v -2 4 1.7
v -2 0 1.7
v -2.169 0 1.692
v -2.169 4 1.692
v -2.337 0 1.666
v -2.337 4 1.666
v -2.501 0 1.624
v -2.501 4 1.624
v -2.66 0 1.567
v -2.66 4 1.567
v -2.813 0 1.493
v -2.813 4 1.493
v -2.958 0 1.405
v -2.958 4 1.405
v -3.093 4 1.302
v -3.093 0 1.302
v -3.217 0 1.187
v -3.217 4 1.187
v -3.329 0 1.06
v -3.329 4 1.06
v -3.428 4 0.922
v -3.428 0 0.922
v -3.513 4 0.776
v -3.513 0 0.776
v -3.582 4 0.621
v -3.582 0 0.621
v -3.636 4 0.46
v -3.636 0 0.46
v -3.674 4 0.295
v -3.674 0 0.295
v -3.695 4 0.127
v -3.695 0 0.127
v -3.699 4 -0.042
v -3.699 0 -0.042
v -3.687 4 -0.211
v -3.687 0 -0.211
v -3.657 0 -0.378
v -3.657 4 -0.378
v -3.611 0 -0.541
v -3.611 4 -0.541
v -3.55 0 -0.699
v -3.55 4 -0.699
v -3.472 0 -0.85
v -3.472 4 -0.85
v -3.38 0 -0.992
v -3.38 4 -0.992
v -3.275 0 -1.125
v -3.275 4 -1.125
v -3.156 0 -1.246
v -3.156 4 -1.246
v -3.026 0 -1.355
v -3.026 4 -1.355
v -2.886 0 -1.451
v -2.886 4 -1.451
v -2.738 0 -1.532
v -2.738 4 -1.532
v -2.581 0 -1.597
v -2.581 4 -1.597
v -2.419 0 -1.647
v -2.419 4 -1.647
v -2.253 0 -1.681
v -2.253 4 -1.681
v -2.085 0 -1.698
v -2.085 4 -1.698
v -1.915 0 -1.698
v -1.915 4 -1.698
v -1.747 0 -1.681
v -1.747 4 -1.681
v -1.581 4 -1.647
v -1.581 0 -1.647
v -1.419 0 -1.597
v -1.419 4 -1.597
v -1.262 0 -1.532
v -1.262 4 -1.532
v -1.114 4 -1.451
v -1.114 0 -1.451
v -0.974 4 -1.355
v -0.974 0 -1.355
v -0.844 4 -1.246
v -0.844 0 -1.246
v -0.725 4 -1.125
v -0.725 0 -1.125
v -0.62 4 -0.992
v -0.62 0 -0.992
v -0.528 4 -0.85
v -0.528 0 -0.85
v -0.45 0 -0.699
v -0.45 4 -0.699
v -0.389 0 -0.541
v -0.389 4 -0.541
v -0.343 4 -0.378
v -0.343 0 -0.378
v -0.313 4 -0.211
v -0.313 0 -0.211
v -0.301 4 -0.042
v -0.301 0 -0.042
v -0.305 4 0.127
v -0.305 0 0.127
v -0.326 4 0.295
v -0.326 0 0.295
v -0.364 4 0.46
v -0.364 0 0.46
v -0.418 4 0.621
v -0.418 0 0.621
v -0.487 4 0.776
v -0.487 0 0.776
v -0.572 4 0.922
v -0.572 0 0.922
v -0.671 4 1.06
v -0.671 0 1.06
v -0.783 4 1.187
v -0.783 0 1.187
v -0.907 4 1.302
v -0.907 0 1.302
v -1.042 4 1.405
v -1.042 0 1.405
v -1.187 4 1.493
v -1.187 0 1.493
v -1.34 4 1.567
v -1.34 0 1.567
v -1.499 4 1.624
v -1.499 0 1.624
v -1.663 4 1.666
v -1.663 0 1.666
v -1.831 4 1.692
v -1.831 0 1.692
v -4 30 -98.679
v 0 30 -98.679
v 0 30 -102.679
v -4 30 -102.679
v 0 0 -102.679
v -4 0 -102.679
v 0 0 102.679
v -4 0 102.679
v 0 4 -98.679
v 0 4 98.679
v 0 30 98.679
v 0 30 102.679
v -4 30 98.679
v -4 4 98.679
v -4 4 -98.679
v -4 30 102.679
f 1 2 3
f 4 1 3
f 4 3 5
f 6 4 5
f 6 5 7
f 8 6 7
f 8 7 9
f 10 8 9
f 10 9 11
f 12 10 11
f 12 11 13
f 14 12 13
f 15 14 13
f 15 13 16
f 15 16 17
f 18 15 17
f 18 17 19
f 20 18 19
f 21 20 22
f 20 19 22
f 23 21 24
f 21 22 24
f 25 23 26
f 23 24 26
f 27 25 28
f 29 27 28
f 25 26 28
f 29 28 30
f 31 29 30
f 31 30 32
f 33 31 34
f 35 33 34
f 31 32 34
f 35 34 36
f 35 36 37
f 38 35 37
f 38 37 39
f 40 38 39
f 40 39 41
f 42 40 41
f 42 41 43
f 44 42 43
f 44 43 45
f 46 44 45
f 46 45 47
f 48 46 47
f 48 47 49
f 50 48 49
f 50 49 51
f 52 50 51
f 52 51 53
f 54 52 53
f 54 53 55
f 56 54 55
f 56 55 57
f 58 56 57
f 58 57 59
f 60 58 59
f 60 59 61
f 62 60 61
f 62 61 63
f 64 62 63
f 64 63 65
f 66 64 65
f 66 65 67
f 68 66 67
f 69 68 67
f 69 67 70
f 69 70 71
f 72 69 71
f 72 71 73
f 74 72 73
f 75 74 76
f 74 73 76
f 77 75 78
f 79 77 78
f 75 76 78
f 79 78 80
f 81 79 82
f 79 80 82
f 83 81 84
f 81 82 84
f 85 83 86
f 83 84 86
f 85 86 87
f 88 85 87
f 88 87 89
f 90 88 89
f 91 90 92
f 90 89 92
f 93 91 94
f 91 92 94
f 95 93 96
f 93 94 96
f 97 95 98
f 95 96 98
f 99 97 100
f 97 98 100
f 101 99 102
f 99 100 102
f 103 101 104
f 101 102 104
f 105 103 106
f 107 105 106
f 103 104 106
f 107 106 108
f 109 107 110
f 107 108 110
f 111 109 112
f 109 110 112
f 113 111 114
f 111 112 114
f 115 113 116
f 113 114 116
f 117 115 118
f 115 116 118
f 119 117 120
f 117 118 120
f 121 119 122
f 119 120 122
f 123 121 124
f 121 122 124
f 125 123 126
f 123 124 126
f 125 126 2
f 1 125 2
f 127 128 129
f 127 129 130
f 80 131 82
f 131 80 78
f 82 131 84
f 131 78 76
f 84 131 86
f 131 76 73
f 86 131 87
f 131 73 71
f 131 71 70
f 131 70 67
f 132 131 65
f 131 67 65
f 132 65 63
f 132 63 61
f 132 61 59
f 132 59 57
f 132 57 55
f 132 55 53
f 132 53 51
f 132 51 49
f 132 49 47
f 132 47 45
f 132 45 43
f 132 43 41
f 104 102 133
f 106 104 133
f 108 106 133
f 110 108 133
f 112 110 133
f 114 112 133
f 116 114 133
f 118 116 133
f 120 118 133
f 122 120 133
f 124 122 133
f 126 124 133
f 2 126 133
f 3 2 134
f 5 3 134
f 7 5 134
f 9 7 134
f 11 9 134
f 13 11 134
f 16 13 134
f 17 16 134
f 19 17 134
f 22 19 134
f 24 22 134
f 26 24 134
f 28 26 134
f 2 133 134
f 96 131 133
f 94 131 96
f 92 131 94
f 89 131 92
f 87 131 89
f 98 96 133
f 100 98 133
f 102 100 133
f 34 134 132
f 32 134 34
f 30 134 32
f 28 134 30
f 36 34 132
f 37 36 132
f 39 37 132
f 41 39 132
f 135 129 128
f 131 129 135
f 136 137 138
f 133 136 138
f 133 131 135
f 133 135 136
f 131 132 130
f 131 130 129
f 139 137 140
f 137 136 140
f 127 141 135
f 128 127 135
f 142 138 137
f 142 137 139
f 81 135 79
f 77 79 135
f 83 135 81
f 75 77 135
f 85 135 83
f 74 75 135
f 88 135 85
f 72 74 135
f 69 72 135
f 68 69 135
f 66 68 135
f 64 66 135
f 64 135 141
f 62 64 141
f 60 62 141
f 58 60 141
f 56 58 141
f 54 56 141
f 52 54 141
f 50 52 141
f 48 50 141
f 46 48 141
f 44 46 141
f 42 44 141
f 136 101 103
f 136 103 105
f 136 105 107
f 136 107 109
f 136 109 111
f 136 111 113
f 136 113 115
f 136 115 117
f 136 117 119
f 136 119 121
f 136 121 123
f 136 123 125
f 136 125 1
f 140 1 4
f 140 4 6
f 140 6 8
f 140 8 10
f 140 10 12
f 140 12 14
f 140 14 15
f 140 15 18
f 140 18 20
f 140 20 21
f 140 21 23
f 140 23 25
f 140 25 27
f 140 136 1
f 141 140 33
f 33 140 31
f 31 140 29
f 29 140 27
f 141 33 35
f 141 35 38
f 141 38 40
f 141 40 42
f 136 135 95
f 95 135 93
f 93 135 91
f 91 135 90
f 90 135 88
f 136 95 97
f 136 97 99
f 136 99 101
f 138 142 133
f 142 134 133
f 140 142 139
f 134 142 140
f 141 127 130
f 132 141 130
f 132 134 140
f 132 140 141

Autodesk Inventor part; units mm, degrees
ref_plane "YZ Plane" through (0, 0, 0) normal (1, 0, 0) x (0, 1, 0)
ref_plane "XZ Plane" through (0, 0, 0) normal (0, 1, 0) x (-1, 0, 0)
ref_plane "XY Plane" through (0, 0, 0) normal (0, 0, 1) x (1, 0, 0)
sketch "Sketch1" plane through (0, 0, 0) normal (0, 1, 0) x (-1, 0, 0)
  line L0 (0, 0) -> (0, 98.679)
  line L1 (0, 0) -> (98.679, 0) construction
  line L2 (0, 98.679) -> (0, -98.679)
  line L3 (0, 98.679) -> (4, 98.679)
  line L4 (4, 98.679) -> (4, -98.679)
  line L5 (4, -98.679) -> (0, -98.679)
  line L6 (4, -98.679) -> (4, -102.679)
  line L7 (4, -102.679) -> (0, -102.679)
  line L8 (0, -102.679) -> (0, -98.679)
  line L9 (4, 98.679) -> (4, 102.679)
  line L10 (4, 102.679) -> (0, 102.679)
  line L11 (0, 102.679) -> (0, 98.679)
  dimension "d0" = 98.679
  dimension "d1" = 90
  dimension "d2" = 197.358
  dimension "d3" = 4
  dimension "d4" = 4
  dimension "d5" = 4
extrude "Extrusion3" add sketch "Sketch1" along normal blind 4 contours L0 L3 L4 L5 L2
extrude "Extrusion4" add sketch "Sketch1" along normal blind 30 contours L11 L10 L9 L3 | L5 L6 L7 L8
sketch "Sketch3" plane through (0, 4, 0) normal (0, 1, 0) x (1, 0, 0)
  line L0 (-4, 102.679) -> (-4, -102.679) projected
  line L1 (-4, -102.679) -> (-2, -102.679)
  line L2 (-2, -102.679) -> (-2, 0)
  point P0 (0, 0)
  dimension "d15" = 2
hole "Hole1" at (-2, 4, 0) direction (0, -1, 0) diameter 3.4 end through all clearance for "Flat Head Machine Screw" size "M3" standard "Ansi Metric M Profile"
